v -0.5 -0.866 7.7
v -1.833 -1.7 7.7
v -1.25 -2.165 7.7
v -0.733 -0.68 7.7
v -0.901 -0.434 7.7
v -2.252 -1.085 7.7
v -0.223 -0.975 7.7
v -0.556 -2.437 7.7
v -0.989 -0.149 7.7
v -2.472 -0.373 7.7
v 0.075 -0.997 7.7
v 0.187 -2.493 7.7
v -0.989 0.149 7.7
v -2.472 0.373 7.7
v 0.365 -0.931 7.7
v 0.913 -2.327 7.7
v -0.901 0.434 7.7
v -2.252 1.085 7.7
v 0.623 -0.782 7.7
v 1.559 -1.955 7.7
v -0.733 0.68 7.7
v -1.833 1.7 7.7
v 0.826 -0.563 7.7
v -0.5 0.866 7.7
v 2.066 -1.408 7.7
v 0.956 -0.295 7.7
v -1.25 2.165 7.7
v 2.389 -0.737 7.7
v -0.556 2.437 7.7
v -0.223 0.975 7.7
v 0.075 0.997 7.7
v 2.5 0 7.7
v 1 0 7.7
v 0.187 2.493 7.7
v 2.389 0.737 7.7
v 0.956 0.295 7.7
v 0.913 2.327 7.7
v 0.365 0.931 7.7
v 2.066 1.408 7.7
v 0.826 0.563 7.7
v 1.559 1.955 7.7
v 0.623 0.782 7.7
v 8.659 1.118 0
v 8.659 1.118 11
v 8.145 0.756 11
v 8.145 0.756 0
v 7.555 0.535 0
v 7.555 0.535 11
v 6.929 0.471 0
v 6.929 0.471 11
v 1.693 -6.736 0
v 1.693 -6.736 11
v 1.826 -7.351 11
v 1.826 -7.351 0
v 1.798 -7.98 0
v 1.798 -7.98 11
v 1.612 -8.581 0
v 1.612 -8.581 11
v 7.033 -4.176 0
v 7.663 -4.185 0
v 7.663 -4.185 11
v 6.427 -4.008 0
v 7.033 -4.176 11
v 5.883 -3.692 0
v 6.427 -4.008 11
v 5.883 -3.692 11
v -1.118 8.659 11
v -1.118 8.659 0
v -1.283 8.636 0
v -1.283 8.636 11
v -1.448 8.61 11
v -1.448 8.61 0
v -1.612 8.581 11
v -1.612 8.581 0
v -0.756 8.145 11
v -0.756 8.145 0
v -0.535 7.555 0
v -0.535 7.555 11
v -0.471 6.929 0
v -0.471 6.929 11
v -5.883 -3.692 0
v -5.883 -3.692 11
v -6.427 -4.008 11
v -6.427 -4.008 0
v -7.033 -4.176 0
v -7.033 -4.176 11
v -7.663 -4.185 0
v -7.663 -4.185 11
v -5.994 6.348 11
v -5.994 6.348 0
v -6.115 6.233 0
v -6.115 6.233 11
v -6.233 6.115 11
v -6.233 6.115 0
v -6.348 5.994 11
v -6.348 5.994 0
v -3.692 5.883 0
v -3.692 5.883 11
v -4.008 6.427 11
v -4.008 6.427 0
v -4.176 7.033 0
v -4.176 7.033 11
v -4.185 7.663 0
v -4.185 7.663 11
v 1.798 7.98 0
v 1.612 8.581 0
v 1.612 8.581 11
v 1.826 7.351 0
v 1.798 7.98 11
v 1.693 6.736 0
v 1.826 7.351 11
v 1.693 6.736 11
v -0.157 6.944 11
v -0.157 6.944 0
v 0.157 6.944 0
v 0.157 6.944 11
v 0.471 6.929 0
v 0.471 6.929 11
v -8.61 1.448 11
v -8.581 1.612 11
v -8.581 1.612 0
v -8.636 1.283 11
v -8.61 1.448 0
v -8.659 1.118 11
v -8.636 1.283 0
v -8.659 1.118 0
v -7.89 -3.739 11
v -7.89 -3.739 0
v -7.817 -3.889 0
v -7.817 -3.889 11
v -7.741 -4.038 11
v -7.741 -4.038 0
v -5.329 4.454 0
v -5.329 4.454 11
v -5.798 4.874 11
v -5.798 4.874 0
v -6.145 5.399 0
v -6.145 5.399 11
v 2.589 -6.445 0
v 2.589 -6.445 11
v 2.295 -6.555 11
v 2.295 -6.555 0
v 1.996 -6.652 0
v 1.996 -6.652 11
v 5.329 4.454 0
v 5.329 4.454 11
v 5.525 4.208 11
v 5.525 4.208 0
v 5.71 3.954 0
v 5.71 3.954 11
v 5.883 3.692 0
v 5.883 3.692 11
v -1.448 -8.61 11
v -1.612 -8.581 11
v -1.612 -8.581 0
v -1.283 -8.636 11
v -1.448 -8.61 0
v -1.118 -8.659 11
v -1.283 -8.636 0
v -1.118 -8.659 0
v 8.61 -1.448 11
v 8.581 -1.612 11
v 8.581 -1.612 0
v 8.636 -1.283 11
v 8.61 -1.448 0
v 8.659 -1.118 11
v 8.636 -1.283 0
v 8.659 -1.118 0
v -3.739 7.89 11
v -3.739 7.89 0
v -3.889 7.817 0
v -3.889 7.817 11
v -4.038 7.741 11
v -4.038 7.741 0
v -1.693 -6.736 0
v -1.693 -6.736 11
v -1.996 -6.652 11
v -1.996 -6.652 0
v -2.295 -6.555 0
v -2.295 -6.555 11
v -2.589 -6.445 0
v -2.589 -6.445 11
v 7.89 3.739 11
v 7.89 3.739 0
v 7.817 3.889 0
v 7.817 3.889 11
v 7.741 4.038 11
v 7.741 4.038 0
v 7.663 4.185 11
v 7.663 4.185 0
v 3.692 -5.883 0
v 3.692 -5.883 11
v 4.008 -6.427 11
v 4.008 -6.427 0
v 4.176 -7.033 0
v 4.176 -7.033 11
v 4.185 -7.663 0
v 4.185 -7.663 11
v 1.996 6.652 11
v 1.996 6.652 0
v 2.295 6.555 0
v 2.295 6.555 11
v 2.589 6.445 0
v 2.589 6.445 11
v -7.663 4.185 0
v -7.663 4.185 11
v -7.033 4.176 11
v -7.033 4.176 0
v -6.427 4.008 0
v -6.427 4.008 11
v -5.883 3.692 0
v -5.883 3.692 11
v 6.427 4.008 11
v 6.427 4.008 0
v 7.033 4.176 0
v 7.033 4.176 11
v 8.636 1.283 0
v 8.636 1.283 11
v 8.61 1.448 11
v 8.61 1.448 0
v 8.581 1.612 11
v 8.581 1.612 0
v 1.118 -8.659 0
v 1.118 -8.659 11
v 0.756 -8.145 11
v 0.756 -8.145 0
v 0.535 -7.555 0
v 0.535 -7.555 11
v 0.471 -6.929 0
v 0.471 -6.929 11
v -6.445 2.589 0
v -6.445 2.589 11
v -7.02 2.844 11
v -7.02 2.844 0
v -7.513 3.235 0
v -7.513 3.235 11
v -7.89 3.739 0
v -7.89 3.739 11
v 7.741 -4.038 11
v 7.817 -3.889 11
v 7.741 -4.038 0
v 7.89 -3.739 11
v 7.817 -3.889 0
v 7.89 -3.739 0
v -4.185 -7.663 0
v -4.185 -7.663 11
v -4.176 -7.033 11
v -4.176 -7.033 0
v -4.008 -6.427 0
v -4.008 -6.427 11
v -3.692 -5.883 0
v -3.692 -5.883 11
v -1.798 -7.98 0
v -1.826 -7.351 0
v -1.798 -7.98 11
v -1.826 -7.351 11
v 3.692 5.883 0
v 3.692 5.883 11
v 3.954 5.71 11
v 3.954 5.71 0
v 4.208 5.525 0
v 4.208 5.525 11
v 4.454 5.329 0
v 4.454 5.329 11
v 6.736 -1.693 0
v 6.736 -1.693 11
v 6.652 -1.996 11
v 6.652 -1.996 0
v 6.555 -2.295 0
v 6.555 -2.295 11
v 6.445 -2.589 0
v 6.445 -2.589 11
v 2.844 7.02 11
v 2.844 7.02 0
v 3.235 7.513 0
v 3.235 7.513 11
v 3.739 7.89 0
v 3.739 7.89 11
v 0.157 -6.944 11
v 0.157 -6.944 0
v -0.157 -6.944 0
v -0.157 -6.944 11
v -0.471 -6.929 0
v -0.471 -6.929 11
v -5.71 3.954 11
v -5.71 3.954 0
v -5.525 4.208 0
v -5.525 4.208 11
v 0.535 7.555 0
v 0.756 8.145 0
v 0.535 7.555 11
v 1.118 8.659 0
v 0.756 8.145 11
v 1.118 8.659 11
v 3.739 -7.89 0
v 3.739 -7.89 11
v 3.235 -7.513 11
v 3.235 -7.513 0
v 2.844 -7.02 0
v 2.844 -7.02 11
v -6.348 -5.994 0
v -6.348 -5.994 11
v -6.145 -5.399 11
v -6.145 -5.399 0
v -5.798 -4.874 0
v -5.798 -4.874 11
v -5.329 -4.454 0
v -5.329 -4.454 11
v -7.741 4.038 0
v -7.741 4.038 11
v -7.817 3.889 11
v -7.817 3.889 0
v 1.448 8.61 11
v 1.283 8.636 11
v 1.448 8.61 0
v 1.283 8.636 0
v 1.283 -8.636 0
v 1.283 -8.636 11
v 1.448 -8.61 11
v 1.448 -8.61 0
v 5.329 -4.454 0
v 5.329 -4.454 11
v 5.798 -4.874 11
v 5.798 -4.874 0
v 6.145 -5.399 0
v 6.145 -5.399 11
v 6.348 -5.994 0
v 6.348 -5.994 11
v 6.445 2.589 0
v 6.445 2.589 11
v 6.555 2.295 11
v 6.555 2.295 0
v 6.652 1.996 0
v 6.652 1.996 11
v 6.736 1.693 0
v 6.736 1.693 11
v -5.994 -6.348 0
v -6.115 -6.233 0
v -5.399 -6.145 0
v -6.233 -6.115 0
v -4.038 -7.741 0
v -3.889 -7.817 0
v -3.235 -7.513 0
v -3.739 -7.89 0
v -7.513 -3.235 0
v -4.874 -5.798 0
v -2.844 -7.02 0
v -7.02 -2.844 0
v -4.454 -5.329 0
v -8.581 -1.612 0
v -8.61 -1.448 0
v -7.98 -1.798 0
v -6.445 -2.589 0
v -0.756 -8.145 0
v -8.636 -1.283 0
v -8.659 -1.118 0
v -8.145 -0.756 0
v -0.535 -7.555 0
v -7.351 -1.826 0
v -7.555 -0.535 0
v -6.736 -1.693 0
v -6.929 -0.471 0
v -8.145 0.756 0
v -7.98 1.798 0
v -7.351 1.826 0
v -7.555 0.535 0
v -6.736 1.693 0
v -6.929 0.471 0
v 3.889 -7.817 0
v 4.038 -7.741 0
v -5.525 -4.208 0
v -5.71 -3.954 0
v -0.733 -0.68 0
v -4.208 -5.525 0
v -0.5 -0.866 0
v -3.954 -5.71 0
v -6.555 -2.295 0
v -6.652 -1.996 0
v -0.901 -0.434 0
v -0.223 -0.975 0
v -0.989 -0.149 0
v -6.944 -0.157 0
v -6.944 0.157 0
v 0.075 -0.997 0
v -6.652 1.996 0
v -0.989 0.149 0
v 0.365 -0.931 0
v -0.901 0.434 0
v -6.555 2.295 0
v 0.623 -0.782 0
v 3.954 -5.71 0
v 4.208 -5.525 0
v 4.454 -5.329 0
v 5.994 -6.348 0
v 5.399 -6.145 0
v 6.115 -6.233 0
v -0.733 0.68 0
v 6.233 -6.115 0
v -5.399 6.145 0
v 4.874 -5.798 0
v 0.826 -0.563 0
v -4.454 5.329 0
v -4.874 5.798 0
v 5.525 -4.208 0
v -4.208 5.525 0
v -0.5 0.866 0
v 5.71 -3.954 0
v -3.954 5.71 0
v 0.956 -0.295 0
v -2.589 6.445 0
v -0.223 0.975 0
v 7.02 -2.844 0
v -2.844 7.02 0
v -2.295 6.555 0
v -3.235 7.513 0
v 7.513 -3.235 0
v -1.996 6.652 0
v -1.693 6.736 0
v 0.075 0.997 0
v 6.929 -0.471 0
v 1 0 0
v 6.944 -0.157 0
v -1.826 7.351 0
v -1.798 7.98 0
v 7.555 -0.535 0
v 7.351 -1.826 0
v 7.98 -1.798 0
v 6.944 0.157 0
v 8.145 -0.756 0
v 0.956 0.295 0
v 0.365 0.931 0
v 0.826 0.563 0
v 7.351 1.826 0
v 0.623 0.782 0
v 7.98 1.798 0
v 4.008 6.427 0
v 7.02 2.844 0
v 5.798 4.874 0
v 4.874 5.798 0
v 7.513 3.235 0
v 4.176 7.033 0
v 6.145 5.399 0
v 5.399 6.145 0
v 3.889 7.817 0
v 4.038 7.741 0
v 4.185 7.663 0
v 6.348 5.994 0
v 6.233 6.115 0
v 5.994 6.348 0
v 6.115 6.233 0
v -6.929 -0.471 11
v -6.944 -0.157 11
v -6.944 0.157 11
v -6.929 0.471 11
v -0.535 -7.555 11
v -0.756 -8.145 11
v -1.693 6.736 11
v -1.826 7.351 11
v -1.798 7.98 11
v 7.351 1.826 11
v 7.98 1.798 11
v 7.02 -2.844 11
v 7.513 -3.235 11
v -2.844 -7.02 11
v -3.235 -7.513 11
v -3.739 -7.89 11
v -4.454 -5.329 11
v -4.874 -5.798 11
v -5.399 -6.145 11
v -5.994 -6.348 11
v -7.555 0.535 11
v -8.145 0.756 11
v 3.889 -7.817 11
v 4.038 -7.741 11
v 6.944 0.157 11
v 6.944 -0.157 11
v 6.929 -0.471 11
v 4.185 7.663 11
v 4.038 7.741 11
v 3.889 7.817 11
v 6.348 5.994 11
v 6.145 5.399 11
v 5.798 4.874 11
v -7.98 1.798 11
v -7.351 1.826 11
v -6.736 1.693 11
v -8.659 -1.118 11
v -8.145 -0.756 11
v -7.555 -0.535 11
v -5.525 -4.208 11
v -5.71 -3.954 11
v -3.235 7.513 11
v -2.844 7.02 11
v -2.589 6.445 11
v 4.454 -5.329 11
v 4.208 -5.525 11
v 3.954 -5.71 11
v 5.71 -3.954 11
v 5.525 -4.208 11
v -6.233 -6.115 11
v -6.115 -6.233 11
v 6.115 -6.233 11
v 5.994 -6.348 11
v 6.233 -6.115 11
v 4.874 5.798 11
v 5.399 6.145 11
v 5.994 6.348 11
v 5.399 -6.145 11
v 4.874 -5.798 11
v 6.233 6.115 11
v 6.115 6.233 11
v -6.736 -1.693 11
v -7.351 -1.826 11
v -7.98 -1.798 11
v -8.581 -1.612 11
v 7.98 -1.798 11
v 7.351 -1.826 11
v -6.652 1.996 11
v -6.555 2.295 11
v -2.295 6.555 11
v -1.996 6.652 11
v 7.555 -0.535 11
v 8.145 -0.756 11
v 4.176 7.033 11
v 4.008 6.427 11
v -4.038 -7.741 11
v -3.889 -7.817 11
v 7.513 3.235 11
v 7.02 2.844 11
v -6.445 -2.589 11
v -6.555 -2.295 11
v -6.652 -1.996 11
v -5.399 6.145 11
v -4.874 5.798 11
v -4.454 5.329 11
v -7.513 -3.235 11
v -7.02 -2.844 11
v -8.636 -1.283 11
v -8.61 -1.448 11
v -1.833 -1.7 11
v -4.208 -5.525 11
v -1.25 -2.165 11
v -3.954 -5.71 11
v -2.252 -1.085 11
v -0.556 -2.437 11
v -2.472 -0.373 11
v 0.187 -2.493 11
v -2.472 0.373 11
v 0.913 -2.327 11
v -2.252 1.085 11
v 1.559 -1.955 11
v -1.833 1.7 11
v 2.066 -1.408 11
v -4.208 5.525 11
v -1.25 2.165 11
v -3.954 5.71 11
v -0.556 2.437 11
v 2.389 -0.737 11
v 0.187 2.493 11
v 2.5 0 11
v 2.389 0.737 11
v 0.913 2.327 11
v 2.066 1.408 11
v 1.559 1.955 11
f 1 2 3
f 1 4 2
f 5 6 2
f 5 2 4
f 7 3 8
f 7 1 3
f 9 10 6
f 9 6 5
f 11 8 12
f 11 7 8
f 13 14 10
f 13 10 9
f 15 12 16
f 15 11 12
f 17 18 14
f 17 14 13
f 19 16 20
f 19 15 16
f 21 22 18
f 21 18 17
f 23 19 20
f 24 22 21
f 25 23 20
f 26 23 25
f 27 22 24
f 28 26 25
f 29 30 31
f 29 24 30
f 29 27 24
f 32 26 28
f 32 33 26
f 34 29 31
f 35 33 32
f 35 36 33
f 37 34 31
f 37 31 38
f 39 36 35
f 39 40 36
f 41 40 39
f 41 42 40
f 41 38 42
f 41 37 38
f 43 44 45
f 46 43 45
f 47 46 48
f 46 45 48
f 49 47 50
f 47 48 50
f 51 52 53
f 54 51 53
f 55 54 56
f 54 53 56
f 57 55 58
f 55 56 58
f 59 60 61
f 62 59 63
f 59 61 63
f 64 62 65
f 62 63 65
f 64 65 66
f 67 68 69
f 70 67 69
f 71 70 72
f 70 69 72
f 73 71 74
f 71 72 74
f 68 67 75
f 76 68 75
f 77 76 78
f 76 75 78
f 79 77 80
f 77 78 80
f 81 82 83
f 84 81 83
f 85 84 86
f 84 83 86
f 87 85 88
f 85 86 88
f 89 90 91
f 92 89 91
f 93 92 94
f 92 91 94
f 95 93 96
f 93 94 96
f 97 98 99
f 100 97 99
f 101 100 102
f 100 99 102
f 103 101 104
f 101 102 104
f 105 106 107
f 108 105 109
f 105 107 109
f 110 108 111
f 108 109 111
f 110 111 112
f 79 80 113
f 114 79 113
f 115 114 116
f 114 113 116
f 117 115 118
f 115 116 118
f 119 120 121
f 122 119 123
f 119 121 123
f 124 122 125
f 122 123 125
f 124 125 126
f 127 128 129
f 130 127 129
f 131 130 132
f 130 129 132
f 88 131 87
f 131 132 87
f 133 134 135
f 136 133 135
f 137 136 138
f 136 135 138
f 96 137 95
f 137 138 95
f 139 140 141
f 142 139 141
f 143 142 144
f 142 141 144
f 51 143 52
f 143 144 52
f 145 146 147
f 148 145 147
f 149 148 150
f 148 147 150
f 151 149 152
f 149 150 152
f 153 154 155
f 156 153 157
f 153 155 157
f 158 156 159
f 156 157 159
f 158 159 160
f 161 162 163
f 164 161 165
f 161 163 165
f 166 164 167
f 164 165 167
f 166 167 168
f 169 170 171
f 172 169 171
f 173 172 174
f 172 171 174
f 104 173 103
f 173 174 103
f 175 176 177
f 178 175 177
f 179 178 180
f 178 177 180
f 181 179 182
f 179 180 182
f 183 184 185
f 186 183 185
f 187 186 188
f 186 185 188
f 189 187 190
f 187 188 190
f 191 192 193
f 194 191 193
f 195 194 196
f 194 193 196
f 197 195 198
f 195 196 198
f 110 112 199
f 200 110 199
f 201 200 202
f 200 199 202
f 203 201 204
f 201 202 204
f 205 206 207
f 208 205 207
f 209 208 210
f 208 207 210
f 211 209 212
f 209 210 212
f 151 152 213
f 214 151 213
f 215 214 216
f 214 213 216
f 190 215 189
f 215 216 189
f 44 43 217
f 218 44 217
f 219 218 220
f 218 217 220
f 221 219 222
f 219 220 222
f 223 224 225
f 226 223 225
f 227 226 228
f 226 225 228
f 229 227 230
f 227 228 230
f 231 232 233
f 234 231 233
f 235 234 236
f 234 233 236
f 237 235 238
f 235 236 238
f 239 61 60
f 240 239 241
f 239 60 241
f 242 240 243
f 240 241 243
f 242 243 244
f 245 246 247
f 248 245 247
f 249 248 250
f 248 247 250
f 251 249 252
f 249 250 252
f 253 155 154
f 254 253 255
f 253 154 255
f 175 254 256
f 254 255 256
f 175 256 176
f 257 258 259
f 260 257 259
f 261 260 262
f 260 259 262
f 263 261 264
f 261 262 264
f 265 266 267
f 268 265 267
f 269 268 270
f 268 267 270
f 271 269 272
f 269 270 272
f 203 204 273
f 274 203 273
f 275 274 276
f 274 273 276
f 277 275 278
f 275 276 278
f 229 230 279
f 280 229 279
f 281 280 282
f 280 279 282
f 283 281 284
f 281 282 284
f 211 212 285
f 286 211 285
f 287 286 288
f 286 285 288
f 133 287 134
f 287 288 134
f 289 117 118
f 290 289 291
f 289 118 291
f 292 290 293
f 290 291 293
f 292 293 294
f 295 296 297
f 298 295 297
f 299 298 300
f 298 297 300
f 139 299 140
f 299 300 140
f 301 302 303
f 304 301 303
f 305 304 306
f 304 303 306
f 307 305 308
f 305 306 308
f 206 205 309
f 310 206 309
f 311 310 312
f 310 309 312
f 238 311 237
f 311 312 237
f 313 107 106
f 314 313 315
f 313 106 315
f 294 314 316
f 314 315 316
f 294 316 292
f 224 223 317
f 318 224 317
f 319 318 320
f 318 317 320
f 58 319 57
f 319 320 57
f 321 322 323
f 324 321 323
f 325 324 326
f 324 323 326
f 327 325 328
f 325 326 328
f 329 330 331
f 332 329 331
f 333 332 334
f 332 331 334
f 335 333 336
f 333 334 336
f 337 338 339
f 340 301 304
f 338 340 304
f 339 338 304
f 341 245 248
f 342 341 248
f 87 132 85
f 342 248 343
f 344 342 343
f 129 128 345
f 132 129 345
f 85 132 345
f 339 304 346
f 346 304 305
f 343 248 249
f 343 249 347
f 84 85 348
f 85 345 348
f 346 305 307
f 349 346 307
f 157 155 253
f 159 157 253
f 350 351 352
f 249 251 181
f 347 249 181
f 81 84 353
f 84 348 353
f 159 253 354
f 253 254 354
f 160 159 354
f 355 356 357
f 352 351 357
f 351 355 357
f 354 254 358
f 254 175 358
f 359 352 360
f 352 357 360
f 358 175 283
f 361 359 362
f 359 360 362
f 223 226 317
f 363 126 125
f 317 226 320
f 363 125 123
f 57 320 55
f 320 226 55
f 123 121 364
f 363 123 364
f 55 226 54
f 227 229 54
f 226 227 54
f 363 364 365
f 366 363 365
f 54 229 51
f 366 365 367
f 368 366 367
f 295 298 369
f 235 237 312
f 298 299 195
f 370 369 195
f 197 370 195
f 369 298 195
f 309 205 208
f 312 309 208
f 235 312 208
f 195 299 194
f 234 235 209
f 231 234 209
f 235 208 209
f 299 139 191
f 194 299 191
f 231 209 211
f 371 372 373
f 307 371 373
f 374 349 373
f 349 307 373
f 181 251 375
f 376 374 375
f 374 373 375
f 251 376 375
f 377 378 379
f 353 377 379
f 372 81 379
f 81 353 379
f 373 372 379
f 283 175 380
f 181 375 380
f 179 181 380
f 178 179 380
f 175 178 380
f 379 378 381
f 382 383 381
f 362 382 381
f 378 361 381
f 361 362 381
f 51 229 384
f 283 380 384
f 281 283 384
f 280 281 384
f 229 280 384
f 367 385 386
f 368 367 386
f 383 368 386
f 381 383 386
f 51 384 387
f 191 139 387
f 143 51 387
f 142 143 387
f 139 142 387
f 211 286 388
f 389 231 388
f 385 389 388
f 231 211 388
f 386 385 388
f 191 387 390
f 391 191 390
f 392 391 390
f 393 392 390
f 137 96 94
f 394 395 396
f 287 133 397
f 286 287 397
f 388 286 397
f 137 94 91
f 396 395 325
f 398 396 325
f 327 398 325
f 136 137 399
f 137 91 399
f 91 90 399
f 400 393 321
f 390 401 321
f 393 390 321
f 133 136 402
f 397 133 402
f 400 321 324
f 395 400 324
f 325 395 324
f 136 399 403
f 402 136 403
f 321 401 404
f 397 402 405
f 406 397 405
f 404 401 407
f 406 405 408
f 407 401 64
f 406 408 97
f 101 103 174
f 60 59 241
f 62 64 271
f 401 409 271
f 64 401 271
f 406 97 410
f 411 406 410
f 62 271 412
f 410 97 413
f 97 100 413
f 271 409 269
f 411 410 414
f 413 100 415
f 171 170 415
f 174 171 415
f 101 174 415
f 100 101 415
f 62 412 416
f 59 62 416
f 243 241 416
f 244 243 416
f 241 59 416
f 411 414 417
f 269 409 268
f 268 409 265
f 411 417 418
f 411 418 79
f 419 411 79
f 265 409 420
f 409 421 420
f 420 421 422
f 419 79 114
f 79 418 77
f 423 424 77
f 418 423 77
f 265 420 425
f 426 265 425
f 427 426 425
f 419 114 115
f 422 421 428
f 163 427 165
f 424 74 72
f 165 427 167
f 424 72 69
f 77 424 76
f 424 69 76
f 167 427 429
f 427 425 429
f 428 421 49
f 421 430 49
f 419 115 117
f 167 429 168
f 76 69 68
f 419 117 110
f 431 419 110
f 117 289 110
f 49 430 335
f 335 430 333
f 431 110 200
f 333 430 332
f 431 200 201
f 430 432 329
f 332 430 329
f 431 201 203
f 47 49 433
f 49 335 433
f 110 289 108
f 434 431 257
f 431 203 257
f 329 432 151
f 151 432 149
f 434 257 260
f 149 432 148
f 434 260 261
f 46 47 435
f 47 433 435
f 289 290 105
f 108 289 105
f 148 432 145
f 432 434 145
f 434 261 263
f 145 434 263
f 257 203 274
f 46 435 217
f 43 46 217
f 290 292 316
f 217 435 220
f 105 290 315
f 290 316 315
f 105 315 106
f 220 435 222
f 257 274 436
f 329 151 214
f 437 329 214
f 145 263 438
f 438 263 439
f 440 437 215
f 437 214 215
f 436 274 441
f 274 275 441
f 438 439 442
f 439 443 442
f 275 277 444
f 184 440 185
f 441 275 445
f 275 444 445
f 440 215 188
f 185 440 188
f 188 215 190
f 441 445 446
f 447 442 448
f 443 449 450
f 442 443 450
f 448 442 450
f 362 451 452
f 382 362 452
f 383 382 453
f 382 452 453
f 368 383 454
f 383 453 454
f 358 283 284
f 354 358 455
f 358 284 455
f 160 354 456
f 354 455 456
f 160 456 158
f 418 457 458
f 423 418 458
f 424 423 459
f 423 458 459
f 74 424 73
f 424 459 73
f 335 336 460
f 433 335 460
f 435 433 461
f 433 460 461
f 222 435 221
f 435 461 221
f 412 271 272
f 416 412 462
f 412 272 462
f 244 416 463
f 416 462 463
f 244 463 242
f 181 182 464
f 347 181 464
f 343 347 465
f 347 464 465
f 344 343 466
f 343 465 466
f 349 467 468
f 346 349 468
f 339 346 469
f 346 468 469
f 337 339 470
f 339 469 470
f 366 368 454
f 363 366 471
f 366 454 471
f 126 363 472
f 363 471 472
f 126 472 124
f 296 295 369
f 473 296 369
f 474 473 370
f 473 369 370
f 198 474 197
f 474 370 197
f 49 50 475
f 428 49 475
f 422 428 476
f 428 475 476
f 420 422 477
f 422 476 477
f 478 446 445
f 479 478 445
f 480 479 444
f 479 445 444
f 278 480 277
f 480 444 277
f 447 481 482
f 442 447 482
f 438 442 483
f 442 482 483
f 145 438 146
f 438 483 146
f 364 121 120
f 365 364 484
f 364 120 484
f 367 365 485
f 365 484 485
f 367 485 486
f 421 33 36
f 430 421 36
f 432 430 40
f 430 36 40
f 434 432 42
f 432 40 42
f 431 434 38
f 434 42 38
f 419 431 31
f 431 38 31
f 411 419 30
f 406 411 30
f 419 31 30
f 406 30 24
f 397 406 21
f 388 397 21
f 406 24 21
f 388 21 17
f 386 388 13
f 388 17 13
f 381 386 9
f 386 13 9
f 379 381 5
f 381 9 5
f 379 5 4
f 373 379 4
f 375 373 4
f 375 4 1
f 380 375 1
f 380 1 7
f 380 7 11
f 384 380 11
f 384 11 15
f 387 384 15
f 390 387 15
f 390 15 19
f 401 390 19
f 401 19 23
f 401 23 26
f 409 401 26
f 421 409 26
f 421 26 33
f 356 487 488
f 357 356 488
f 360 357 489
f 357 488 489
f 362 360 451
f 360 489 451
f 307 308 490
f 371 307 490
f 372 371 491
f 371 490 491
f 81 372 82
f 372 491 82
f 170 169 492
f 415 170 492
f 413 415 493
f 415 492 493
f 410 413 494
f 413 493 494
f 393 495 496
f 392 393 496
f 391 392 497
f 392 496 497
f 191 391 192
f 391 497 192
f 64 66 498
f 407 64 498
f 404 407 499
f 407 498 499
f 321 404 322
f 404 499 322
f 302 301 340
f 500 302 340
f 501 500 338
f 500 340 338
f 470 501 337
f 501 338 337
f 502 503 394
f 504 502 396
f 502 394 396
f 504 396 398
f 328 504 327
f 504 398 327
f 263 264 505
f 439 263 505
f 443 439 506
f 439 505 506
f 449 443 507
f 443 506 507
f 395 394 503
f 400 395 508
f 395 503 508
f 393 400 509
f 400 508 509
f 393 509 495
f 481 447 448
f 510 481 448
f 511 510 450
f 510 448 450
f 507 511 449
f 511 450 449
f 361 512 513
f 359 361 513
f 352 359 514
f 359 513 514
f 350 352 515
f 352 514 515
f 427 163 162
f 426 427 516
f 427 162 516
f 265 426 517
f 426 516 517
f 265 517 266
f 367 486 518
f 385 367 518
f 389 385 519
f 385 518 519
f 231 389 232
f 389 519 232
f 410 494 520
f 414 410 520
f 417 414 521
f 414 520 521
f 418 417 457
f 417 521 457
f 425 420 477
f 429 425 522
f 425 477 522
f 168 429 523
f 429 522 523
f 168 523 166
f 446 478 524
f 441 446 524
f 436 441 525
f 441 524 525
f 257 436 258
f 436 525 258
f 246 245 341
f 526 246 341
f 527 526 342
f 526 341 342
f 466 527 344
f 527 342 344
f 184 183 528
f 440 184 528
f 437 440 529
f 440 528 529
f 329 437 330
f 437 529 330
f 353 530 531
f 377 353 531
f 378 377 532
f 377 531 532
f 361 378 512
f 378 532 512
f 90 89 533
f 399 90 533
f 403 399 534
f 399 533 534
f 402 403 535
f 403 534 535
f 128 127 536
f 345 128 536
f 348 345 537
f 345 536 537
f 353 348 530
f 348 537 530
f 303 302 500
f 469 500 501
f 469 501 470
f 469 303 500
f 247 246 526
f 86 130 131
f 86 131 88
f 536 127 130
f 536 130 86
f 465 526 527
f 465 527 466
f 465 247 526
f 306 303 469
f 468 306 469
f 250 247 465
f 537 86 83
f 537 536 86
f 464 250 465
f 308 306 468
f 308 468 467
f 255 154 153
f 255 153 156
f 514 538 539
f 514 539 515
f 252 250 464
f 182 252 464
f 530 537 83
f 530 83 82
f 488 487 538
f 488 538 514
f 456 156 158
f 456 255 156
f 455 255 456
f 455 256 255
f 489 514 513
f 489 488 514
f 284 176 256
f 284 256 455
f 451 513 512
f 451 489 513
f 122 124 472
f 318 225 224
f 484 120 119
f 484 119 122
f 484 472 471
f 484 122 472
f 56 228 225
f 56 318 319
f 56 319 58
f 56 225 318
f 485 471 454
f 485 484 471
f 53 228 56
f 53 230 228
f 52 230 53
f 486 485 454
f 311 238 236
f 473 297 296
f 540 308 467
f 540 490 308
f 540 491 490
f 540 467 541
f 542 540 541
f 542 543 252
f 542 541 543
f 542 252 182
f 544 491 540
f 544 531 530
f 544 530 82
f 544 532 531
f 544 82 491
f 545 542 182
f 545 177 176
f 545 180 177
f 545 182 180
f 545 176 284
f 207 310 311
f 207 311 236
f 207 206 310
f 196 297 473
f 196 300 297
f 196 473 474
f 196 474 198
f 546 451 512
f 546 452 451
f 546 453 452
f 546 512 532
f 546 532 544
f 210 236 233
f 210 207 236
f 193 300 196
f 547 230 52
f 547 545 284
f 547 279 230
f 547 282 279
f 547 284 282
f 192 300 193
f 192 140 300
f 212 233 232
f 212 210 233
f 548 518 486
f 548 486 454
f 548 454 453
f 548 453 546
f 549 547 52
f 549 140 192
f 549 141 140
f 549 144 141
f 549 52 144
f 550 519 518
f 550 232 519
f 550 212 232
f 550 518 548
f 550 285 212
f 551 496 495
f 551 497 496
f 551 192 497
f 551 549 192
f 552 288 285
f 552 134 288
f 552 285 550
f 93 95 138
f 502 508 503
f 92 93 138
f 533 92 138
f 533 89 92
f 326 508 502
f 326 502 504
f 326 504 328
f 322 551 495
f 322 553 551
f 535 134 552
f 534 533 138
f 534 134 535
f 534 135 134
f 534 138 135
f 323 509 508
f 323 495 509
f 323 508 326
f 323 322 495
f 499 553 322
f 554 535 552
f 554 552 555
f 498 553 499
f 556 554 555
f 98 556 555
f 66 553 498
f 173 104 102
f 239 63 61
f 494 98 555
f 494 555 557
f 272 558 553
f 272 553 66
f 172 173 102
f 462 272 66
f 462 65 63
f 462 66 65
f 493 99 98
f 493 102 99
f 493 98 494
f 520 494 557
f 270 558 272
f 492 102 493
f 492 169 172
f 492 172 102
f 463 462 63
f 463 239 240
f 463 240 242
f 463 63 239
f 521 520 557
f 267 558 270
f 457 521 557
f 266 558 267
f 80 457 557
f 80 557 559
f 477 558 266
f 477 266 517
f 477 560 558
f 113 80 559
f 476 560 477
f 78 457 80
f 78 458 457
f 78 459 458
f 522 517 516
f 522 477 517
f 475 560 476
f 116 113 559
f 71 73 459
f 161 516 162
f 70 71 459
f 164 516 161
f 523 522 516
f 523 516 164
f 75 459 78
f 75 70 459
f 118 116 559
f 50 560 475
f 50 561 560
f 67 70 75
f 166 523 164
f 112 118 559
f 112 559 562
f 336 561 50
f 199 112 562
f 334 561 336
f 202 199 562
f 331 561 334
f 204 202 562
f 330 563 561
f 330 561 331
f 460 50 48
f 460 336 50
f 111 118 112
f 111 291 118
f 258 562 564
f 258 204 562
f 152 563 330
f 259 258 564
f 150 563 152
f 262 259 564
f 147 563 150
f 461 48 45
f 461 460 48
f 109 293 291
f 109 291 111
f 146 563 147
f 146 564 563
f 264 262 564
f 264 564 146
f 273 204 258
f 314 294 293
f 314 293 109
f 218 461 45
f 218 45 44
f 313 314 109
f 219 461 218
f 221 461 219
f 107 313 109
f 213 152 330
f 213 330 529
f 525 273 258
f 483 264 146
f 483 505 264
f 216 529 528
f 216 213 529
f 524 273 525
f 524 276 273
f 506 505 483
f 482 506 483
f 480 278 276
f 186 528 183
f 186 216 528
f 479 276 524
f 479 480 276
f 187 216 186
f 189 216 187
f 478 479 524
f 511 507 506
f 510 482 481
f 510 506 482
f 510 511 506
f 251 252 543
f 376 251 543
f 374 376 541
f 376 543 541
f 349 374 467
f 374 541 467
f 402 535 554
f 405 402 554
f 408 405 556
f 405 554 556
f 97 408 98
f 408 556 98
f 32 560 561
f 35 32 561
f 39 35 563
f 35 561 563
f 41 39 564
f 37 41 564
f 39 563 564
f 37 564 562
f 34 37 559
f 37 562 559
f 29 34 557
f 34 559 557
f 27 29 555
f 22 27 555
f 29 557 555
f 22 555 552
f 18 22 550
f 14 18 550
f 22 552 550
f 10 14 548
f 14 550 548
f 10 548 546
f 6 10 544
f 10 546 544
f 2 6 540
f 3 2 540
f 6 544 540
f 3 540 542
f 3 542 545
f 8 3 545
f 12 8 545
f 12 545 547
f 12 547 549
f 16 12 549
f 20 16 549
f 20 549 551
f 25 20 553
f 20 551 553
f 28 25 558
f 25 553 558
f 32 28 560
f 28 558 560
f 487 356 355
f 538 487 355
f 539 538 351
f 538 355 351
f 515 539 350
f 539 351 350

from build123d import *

# Parameters (mm, degrees)
SKETCH1_R           = 8.73125
BOSS_EXTRUDE1_DEPTH = 11
CUT_EXTRUDE1_DEPTH  = 17.536911838
CIRPATTERN1_COUNT   = 20
SKETCH4_R           = 2.5
CUT_EXTRUDE2_DEPTH  = 3.3
SKETCH5_R           = 1
CUT_EXTRUDE3_DEPTH  = 15.465788277


with BuildPart() as part:
    # Sketch1 → Boss-Extrude1 (new body)
    with BuildSketch(Plane.XY):
        Circle(SKETCH1_R)
    extrude(amount=BOSS_EXTRUDE1_DEPTH)

    # Sketch2 → Cut-Extrude1 (cut, through all)
    with BuildSketch(Plane.XY.offset(11)):
        with BuildLine():
            Line((9.170880897, -1.77931535), (9.170880897, 1.77931535))
            ThreePointArc((9.170880897, 1.77931535), (8.236219229, 0.806271061), (6.929309614, 0.4710176))
            ThreePointArc((6.929309614, 0.4710176), (6.9452998, 0), (6.929309614, -0.4710176))
            ThreePointArc((6.929309614, -0.4710176), (8.236219229, -0.806271061), (9.170880897, -1.77931535))
        make_face()
    cut_extrude1 = extrude(amount=-CUT_EXTRUDE1_DEPTH, mode=Mode.SUBTRACT)

    # CirPattern1: Cut-Extrude1 ×20 about axis
    cirpattern1_axis = Axis((0, 0, 0), (0, 0, 1))
    for i in range(1, CIRPATTERN1_COUNT):
        add(cut_extrude1.rotate(cirpattern1_axis, i * 360 / CIRPATTERN1_COUNT), mode=Mode.SUBTRACT)

    # Sketch4 → Cut-Extrude2 (cut)
    with BuildSketch(Plane.XY.offset(11)):
        Circle(SKETCH4_R)
    extrude(amount=-CUT_EXTRUDE2_DEPTH, mode=Mode.SUBTRACT)

    # Sketch5 → Cut-Extrude3 (cut, through all)
    with BuildSketch(Plane.XY.offset(7.7)):
        Circle(SKETCH5_R)
    extrude(amount=-CUT_EXTRUDE3_DEPTH, mode=Mode.SUBTRACT)


solid = part.part
